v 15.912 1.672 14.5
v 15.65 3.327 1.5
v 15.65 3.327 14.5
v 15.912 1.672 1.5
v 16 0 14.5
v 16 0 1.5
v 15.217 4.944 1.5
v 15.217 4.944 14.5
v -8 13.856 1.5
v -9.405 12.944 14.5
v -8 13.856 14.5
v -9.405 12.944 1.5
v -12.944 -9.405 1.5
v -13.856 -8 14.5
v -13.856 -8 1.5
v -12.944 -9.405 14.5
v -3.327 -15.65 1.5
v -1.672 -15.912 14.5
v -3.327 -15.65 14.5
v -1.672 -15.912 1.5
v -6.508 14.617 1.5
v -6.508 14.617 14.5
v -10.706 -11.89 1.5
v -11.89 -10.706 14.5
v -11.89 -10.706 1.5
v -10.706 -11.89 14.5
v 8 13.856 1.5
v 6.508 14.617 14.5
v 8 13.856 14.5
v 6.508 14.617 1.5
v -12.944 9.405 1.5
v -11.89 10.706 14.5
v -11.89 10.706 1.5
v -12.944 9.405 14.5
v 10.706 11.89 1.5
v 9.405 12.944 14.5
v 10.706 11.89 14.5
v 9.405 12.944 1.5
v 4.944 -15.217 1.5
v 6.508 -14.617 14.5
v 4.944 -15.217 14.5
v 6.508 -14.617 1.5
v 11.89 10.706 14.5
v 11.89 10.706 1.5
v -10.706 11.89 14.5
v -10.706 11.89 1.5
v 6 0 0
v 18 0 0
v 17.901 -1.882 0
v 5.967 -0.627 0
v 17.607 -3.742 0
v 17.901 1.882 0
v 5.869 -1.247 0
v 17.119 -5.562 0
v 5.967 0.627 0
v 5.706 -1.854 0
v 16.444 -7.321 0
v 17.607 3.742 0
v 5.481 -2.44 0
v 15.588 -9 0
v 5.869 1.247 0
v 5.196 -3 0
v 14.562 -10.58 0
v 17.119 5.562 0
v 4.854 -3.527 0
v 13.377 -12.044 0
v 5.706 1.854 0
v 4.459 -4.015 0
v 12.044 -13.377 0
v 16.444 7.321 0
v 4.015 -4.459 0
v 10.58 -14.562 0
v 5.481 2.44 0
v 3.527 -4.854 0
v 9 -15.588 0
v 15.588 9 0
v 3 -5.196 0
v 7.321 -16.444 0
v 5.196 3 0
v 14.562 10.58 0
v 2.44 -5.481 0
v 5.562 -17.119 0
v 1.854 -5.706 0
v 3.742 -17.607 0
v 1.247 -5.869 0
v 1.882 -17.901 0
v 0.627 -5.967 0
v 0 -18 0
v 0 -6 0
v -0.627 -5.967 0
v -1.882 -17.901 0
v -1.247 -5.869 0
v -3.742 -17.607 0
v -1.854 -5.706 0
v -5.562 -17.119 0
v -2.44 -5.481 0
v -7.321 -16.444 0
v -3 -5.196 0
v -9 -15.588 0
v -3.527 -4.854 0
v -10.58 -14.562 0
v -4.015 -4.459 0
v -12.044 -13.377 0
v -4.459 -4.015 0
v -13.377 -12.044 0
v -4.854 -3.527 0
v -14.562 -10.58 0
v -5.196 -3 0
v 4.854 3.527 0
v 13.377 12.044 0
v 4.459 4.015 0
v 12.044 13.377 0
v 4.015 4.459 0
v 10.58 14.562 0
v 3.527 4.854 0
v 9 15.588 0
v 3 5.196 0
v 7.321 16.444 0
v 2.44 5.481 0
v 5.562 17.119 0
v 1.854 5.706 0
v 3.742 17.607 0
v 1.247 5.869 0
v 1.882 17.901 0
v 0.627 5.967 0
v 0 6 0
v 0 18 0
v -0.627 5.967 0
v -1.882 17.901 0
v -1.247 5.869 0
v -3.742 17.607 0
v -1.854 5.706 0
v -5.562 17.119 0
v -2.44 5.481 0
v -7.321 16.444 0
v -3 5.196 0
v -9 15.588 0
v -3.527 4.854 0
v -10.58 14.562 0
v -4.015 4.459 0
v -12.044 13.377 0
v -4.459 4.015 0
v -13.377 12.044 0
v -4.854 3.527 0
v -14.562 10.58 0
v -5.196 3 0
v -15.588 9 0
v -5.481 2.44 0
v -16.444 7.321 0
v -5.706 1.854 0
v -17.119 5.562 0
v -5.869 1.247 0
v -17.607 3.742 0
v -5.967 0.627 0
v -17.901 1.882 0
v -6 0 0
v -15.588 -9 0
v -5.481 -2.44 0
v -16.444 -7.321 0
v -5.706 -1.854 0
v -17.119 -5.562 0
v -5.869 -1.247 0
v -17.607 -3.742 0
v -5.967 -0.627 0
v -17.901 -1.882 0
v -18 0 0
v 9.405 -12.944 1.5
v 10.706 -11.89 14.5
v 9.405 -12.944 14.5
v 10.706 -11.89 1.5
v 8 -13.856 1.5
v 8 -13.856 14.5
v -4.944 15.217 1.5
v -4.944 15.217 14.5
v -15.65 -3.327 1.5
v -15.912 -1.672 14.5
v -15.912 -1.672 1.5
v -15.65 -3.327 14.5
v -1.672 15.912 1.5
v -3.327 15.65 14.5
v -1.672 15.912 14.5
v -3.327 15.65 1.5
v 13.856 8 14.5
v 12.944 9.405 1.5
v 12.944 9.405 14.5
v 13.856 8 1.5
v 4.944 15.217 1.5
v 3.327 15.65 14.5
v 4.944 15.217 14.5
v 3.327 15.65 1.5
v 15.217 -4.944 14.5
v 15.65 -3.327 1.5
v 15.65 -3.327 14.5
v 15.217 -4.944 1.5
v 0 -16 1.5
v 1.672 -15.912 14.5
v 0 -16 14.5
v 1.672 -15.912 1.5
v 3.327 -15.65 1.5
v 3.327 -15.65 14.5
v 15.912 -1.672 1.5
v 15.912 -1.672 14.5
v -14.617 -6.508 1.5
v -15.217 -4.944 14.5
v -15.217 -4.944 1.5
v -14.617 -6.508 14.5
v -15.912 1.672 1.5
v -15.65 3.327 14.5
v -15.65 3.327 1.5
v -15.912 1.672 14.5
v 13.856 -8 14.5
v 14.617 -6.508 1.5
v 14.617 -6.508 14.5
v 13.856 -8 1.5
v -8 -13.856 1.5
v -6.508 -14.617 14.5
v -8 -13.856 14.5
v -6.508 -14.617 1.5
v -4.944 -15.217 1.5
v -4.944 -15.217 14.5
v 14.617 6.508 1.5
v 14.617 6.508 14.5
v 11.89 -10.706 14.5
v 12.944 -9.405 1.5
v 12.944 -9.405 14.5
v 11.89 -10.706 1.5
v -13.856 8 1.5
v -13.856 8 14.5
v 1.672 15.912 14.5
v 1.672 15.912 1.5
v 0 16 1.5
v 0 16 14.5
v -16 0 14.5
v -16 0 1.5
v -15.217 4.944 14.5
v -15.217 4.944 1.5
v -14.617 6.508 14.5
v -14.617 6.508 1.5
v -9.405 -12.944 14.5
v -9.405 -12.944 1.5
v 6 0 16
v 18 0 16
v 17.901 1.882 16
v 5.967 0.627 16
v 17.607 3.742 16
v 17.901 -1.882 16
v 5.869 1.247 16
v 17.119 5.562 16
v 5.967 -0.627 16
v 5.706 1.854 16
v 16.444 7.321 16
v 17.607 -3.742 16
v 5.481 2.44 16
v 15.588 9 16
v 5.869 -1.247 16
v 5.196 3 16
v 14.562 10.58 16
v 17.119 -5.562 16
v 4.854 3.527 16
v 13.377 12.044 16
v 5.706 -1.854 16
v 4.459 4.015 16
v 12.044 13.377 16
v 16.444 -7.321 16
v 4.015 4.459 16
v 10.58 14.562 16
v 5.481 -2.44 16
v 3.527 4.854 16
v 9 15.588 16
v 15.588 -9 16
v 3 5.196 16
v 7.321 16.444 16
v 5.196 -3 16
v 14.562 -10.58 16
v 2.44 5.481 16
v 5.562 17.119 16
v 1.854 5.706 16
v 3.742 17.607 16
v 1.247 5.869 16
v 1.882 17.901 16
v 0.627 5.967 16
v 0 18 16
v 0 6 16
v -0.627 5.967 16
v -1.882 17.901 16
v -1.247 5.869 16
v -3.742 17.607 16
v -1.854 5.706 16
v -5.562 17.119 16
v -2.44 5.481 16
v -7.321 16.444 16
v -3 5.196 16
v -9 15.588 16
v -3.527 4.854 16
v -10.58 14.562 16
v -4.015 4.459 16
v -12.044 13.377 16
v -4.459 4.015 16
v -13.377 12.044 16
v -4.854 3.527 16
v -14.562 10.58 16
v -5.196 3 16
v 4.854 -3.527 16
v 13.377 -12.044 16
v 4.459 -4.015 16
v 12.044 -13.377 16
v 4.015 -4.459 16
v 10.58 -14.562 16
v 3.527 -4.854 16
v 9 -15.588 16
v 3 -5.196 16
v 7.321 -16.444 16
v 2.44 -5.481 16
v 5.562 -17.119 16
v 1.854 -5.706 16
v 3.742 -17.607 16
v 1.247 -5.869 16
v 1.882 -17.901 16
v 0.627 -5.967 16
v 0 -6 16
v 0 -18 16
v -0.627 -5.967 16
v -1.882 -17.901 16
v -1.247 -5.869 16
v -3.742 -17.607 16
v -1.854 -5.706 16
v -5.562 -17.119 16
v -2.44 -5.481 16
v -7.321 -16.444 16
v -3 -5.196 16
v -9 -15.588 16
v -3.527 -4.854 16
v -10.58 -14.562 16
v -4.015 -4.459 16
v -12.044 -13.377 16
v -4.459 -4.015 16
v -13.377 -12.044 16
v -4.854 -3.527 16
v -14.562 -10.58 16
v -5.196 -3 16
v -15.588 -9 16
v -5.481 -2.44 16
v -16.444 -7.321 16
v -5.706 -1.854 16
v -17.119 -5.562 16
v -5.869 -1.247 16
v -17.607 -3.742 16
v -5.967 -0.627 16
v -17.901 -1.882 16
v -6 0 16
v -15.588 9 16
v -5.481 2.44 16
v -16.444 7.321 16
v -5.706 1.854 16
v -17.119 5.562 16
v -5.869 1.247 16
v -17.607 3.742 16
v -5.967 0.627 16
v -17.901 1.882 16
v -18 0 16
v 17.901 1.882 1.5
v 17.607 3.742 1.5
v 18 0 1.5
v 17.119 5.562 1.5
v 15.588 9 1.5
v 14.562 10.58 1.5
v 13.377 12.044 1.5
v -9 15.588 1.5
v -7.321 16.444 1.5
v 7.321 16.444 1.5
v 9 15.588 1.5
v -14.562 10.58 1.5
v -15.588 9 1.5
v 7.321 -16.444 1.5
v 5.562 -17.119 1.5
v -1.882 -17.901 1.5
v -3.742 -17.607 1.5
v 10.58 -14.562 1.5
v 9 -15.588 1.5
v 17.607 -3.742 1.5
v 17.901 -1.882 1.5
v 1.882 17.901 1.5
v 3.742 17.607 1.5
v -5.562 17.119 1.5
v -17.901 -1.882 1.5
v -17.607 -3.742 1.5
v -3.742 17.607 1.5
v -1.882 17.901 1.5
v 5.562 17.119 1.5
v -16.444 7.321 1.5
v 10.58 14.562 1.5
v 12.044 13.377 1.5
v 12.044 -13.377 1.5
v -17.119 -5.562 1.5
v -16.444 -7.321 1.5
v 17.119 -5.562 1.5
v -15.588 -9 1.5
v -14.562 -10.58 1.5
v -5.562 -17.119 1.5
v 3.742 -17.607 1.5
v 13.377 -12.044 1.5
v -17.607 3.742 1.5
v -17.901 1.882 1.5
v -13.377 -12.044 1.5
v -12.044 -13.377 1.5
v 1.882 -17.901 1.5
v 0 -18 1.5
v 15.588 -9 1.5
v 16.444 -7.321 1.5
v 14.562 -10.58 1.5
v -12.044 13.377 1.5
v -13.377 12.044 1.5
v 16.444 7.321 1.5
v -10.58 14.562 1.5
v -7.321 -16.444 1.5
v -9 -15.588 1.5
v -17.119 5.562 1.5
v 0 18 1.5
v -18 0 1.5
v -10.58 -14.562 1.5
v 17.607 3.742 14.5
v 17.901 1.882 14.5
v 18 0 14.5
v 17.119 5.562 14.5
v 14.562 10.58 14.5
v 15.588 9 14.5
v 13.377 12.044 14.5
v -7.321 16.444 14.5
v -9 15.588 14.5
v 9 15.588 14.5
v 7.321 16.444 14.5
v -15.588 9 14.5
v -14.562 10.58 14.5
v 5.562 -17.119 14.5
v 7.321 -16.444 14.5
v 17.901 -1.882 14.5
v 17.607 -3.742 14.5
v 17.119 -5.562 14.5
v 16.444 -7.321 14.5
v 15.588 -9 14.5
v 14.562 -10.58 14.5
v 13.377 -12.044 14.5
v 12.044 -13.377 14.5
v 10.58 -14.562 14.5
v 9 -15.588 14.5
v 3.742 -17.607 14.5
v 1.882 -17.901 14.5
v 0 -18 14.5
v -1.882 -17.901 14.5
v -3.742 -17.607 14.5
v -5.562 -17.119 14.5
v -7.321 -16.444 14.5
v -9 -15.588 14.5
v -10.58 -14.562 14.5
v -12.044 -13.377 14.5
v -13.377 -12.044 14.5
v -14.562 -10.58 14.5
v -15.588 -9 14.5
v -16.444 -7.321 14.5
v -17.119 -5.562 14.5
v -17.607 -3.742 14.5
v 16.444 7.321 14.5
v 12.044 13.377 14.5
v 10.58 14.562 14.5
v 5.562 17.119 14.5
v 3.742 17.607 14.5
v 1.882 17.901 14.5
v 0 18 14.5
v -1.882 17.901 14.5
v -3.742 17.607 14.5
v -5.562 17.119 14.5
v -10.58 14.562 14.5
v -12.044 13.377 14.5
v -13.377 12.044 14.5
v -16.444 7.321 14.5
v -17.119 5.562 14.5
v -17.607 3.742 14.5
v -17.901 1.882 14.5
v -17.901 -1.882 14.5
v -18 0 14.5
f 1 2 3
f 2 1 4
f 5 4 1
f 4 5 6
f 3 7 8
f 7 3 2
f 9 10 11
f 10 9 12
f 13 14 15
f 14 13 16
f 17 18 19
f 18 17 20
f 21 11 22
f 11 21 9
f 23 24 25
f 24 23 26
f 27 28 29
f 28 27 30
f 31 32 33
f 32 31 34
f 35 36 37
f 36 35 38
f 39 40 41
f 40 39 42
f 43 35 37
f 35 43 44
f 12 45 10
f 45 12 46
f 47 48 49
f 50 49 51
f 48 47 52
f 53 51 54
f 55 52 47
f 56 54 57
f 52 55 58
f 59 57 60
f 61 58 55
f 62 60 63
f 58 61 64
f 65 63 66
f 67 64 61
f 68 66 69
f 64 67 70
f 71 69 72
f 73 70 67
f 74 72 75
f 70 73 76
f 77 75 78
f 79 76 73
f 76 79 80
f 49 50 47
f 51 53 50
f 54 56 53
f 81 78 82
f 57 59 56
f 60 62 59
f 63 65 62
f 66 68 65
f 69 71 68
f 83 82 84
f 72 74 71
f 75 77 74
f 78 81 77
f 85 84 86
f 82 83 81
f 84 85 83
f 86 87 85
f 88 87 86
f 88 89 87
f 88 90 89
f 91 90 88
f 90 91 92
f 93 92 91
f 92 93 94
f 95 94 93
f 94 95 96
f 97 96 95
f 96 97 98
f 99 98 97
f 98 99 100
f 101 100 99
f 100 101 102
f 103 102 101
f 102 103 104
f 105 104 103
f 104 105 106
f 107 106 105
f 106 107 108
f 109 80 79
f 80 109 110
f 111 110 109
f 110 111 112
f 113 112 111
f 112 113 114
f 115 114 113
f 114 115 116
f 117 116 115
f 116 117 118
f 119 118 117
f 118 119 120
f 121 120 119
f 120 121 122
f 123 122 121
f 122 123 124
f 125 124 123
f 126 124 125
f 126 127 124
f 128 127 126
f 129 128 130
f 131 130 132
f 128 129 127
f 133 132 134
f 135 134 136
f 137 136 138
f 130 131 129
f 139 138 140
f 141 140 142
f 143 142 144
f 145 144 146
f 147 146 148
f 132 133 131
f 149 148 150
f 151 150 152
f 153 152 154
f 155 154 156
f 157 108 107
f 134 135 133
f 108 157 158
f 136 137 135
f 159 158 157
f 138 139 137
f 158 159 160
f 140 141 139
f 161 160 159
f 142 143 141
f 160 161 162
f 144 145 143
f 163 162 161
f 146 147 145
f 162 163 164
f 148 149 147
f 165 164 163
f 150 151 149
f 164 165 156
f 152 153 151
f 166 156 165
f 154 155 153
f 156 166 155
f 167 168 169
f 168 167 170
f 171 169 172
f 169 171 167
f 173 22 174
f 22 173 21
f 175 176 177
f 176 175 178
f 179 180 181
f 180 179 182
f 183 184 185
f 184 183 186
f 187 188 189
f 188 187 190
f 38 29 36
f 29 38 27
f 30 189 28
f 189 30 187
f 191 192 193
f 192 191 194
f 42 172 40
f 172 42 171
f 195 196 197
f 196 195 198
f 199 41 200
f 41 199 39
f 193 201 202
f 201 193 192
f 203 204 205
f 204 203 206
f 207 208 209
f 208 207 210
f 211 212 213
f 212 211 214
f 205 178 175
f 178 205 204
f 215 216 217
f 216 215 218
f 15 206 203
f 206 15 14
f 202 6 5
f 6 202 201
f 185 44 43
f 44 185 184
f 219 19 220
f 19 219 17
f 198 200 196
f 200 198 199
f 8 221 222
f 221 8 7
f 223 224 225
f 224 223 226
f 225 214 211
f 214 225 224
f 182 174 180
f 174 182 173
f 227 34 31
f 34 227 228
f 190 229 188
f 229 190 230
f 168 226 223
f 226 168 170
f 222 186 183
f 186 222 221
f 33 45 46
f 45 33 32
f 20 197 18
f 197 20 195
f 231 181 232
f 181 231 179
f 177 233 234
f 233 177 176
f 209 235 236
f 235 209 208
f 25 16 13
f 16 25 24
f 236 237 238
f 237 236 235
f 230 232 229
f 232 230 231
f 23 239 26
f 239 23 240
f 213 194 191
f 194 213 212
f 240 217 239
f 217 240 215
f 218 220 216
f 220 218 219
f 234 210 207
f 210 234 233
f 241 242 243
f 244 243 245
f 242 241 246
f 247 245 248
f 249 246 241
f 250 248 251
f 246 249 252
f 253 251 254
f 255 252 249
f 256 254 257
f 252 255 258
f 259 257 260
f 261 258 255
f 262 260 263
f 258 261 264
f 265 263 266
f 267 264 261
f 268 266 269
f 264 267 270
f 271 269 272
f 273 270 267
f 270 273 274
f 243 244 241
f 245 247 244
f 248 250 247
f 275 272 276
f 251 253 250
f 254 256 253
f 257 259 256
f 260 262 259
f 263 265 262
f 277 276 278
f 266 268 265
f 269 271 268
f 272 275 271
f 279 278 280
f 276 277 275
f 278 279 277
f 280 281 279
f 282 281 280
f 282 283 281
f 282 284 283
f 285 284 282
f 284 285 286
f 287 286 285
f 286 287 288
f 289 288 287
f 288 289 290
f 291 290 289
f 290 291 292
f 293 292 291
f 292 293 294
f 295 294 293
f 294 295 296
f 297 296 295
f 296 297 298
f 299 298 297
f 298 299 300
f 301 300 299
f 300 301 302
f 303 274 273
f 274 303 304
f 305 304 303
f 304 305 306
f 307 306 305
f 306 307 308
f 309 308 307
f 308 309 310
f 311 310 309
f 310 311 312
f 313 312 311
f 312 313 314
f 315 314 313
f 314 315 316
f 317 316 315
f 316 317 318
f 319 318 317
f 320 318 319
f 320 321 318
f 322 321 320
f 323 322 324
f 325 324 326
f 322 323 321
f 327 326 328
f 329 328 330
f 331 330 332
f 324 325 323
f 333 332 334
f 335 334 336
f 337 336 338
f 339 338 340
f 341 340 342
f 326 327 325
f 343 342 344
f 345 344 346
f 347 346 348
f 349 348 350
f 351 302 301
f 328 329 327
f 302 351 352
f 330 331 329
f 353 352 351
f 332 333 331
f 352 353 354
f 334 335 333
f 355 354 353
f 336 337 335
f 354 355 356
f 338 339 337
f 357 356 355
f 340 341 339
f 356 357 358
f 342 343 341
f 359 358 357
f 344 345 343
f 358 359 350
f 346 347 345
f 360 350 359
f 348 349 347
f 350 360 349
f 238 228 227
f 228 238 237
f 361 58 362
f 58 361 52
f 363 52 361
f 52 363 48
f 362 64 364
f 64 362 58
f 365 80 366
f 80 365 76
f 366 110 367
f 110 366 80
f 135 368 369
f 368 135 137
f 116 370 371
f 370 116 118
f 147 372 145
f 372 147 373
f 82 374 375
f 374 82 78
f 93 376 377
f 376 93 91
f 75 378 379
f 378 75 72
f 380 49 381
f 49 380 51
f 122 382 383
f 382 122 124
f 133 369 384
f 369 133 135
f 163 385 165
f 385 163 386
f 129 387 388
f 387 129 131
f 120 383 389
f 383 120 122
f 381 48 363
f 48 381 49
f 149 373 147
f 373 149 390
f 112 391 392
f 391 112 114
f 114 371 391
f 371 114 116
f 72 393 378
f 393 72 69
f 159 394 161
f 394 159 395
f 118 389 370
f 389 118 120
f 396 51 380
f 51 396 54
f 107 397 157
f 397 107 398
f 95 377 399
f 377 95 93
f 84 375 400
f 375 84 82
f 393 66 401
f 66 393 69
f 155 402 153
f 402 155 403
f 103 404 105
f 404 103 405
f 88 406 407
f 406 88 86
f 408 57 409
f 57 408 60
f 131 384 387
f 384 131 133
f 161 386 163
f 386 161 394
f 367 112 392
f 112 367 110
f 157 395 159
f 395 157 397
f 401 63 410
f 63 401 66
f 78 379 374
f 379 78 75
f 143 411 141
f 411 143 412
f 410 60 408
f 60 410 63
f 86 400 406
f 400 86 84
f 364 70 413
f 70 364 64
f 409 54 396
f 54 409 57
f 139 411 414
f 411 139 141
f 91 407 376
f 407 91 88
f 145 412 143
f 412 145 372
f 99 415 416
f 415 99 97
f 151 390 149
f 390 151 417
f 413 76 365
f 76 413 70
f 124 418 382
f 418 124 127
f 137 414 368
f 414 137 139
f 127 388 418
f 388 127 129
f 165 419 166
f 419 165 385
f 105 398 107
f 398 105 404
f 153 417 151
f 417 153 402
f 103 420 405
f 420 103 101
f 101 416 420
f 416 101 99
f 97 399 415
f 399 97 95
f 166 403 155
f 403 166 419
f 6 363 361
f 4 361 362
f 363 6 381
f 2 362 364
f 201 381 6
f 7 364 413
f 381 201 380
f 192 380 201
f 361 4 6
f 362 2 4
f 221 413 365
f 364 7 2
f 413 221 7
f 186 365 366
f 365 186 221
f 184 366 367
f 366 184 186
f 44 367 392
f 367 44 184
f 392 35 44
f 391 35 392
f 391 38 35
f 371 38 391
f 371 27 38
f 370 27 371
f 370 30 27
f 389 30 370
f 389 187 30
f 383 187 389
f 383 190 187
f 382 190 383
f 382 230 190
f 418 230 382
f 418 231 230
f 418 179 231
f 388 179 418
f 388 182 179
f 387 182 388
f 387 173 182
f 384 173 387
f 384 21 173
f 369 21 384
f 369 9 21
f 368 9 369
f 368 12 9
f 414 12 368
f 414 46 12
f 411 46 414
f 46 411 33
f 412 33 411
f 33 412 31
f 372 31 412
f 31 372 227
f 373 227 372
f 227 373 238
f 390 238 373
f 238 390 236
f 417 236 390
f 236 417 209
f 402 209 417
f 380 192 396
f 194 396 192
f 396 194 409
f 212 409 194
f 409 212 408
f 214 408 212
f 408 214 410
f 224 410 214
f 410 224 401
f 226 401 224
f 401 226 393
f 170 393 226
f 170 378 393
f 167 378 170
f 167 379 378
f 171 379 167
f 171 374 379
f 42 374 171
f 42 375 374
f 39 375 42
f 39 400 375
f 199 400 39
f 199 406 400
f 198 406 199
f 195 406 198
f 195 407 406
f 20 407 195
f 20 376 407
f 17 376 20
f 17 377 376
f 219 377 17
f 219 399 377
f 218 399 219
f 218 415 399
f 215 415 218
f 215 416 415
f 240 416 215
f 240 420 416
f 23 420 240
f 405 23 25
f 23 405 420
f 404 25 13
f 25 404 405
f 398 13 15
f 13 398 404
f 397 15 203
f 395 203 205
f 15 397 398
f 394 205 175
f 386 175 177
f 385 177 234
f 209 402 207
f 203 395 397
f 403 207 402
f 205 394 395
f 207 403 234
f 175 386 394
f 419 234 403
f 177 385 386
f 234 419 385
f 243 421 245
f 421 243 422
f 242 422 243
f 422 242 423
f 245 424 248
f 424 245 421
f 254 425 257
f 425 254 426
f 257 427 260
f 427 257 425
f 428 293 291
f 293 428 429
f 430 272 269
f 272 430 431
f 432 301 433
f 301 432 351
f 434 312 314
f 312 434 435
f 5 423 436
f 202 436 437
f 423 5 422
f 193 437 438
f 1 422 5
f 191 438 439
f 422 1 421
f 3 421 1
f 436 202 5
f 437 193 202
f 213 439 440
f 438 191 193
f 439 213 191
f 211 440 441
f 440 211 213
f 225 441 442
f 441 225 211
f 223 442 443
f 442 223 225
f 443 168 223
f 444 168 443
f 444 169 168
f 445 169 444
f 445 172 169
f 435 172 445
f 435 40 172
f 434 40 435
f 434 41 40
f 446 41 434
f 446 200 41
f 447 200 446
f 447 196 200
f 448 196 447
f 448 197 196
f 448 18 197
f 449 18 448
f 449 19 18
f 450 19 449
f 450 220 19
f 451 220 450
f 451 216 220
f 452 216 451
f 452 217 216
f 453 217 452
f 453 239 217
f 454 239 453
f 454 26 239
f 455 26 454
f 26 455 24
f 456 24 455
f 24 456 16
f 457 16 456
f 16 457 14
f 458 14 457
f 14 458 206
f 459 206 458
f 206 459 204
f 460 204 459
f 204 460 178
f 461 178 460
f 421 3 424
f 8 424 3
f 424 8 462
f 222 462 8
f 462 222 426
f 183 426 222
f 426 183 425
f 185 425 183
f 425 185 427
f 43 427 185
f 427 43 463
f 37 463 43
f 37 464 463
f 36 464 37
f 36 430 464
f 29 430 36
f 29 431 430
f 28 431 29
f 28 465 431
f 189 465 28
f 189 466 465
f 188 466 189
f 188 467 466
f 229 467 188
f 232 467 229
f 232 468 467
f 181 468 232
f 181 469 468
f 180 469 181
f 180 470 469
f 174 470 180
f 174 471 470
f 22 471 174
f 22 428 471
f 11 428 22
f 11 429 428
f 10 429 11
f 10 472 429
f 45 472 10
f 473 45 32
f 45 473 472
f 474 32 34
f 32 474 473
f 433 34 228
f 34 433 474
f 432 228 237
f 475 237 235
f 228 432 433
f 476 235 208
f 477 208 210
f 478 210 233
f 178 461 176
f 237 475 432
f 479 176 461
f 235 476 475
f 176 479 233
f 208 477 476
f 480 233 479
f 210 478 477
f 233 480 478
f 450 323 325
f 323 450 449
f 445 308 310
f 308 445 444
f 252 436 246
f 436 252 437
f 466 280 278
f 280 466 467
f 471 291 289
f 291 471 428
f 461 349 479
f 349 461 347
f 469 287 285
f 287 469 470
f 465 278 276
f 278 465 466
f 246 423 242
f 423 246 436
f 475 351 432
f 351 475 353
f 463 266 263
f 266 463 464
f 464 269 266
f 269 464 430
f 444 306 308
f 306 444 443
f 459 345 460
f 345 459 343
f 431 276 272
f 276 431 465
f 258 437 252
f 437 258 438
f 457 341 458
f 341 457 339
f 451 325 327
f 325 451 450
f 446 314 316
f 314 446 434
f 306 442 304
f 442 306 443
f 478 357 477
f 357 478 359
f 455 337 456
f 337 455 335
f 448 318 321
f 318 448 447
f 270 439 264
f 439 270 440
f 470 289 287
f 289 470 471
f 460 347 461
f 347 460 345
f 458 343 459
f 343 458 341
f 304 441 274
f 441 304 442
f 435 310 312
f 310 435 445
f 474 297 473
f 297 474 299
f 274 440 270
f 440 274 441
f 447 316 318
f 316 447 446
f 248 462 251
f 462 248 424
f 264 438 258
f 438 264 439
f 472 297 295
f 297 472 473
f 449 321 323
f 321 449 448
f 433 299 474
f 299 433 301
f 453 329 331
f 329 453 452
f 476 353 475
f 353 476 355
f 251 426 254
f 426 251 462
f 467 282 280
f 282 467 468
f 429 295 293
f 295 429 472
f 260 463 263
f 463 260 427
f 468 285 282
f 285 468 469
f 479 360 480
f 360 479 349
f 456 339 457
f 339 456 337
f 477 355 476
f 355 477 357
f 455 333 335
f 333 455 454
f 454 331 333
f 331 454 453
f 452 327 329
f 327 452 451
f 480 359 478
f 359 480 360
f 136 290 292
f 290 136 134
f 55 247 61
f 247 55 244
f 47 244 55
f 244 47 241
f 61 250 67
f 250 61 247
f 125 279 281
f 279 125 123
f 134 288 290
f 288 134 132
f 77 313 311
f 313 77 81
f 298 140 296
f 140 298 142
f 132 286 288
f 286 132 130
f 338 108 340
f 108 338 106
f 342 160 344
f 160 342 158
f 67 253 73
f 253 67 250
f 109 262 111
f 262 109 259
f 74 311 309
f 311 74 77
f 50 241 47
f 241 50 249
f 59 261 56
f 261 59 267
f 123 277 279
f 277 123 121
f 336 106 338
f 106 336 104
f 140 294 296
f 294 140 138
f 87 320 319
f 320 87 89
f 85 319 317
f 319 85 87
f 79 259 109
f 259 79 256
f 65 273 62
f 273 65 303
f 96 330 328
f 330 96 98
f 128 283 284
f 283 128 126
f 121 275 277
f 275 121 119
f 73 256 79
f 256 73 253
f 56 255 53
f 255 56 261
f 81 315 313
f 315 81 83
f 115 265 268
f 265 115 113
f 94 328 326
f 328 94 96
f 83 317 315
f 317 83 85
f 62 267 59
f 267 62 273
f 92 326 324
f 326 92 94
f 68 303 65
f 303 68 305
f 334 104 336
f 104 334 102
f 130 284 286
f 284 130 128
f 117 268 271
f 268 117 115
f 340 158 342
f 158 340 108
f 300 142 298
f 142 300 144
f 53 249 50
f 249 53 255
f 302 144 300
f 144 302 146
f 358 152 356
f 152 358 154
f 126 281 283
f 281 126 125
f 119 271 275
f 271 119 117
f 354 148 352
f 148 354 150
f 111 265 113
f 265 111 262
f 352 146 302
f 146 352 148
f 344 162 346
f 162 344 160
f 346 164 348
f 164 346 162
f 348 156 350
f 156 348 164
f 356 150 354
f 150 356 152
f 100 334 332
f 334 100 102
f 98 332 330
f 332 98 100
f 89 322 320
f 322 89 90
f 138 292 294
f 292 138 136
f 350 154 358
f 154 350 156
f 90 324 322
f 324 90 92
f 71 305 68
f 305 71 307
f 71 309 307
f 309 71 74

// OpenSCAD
// Plain idler pulley with retaining flanges.
$fn = 60;
eps = 0.02;
bore_d = 12;
body_d = 32;
width = 16;
flange_t = 1.5;
difference() {
    union() {
        cylinder(d=body_d,h=width);
        cylinder(d=body_d+4,h=flange_t);
        translate([0,0,width-flange_t]) cylinder(d=body_d+4,h=flange_t);
    }
    translate([0,0,-eps]) cylinder(d=bore_d,h=width+2*eps);
}
